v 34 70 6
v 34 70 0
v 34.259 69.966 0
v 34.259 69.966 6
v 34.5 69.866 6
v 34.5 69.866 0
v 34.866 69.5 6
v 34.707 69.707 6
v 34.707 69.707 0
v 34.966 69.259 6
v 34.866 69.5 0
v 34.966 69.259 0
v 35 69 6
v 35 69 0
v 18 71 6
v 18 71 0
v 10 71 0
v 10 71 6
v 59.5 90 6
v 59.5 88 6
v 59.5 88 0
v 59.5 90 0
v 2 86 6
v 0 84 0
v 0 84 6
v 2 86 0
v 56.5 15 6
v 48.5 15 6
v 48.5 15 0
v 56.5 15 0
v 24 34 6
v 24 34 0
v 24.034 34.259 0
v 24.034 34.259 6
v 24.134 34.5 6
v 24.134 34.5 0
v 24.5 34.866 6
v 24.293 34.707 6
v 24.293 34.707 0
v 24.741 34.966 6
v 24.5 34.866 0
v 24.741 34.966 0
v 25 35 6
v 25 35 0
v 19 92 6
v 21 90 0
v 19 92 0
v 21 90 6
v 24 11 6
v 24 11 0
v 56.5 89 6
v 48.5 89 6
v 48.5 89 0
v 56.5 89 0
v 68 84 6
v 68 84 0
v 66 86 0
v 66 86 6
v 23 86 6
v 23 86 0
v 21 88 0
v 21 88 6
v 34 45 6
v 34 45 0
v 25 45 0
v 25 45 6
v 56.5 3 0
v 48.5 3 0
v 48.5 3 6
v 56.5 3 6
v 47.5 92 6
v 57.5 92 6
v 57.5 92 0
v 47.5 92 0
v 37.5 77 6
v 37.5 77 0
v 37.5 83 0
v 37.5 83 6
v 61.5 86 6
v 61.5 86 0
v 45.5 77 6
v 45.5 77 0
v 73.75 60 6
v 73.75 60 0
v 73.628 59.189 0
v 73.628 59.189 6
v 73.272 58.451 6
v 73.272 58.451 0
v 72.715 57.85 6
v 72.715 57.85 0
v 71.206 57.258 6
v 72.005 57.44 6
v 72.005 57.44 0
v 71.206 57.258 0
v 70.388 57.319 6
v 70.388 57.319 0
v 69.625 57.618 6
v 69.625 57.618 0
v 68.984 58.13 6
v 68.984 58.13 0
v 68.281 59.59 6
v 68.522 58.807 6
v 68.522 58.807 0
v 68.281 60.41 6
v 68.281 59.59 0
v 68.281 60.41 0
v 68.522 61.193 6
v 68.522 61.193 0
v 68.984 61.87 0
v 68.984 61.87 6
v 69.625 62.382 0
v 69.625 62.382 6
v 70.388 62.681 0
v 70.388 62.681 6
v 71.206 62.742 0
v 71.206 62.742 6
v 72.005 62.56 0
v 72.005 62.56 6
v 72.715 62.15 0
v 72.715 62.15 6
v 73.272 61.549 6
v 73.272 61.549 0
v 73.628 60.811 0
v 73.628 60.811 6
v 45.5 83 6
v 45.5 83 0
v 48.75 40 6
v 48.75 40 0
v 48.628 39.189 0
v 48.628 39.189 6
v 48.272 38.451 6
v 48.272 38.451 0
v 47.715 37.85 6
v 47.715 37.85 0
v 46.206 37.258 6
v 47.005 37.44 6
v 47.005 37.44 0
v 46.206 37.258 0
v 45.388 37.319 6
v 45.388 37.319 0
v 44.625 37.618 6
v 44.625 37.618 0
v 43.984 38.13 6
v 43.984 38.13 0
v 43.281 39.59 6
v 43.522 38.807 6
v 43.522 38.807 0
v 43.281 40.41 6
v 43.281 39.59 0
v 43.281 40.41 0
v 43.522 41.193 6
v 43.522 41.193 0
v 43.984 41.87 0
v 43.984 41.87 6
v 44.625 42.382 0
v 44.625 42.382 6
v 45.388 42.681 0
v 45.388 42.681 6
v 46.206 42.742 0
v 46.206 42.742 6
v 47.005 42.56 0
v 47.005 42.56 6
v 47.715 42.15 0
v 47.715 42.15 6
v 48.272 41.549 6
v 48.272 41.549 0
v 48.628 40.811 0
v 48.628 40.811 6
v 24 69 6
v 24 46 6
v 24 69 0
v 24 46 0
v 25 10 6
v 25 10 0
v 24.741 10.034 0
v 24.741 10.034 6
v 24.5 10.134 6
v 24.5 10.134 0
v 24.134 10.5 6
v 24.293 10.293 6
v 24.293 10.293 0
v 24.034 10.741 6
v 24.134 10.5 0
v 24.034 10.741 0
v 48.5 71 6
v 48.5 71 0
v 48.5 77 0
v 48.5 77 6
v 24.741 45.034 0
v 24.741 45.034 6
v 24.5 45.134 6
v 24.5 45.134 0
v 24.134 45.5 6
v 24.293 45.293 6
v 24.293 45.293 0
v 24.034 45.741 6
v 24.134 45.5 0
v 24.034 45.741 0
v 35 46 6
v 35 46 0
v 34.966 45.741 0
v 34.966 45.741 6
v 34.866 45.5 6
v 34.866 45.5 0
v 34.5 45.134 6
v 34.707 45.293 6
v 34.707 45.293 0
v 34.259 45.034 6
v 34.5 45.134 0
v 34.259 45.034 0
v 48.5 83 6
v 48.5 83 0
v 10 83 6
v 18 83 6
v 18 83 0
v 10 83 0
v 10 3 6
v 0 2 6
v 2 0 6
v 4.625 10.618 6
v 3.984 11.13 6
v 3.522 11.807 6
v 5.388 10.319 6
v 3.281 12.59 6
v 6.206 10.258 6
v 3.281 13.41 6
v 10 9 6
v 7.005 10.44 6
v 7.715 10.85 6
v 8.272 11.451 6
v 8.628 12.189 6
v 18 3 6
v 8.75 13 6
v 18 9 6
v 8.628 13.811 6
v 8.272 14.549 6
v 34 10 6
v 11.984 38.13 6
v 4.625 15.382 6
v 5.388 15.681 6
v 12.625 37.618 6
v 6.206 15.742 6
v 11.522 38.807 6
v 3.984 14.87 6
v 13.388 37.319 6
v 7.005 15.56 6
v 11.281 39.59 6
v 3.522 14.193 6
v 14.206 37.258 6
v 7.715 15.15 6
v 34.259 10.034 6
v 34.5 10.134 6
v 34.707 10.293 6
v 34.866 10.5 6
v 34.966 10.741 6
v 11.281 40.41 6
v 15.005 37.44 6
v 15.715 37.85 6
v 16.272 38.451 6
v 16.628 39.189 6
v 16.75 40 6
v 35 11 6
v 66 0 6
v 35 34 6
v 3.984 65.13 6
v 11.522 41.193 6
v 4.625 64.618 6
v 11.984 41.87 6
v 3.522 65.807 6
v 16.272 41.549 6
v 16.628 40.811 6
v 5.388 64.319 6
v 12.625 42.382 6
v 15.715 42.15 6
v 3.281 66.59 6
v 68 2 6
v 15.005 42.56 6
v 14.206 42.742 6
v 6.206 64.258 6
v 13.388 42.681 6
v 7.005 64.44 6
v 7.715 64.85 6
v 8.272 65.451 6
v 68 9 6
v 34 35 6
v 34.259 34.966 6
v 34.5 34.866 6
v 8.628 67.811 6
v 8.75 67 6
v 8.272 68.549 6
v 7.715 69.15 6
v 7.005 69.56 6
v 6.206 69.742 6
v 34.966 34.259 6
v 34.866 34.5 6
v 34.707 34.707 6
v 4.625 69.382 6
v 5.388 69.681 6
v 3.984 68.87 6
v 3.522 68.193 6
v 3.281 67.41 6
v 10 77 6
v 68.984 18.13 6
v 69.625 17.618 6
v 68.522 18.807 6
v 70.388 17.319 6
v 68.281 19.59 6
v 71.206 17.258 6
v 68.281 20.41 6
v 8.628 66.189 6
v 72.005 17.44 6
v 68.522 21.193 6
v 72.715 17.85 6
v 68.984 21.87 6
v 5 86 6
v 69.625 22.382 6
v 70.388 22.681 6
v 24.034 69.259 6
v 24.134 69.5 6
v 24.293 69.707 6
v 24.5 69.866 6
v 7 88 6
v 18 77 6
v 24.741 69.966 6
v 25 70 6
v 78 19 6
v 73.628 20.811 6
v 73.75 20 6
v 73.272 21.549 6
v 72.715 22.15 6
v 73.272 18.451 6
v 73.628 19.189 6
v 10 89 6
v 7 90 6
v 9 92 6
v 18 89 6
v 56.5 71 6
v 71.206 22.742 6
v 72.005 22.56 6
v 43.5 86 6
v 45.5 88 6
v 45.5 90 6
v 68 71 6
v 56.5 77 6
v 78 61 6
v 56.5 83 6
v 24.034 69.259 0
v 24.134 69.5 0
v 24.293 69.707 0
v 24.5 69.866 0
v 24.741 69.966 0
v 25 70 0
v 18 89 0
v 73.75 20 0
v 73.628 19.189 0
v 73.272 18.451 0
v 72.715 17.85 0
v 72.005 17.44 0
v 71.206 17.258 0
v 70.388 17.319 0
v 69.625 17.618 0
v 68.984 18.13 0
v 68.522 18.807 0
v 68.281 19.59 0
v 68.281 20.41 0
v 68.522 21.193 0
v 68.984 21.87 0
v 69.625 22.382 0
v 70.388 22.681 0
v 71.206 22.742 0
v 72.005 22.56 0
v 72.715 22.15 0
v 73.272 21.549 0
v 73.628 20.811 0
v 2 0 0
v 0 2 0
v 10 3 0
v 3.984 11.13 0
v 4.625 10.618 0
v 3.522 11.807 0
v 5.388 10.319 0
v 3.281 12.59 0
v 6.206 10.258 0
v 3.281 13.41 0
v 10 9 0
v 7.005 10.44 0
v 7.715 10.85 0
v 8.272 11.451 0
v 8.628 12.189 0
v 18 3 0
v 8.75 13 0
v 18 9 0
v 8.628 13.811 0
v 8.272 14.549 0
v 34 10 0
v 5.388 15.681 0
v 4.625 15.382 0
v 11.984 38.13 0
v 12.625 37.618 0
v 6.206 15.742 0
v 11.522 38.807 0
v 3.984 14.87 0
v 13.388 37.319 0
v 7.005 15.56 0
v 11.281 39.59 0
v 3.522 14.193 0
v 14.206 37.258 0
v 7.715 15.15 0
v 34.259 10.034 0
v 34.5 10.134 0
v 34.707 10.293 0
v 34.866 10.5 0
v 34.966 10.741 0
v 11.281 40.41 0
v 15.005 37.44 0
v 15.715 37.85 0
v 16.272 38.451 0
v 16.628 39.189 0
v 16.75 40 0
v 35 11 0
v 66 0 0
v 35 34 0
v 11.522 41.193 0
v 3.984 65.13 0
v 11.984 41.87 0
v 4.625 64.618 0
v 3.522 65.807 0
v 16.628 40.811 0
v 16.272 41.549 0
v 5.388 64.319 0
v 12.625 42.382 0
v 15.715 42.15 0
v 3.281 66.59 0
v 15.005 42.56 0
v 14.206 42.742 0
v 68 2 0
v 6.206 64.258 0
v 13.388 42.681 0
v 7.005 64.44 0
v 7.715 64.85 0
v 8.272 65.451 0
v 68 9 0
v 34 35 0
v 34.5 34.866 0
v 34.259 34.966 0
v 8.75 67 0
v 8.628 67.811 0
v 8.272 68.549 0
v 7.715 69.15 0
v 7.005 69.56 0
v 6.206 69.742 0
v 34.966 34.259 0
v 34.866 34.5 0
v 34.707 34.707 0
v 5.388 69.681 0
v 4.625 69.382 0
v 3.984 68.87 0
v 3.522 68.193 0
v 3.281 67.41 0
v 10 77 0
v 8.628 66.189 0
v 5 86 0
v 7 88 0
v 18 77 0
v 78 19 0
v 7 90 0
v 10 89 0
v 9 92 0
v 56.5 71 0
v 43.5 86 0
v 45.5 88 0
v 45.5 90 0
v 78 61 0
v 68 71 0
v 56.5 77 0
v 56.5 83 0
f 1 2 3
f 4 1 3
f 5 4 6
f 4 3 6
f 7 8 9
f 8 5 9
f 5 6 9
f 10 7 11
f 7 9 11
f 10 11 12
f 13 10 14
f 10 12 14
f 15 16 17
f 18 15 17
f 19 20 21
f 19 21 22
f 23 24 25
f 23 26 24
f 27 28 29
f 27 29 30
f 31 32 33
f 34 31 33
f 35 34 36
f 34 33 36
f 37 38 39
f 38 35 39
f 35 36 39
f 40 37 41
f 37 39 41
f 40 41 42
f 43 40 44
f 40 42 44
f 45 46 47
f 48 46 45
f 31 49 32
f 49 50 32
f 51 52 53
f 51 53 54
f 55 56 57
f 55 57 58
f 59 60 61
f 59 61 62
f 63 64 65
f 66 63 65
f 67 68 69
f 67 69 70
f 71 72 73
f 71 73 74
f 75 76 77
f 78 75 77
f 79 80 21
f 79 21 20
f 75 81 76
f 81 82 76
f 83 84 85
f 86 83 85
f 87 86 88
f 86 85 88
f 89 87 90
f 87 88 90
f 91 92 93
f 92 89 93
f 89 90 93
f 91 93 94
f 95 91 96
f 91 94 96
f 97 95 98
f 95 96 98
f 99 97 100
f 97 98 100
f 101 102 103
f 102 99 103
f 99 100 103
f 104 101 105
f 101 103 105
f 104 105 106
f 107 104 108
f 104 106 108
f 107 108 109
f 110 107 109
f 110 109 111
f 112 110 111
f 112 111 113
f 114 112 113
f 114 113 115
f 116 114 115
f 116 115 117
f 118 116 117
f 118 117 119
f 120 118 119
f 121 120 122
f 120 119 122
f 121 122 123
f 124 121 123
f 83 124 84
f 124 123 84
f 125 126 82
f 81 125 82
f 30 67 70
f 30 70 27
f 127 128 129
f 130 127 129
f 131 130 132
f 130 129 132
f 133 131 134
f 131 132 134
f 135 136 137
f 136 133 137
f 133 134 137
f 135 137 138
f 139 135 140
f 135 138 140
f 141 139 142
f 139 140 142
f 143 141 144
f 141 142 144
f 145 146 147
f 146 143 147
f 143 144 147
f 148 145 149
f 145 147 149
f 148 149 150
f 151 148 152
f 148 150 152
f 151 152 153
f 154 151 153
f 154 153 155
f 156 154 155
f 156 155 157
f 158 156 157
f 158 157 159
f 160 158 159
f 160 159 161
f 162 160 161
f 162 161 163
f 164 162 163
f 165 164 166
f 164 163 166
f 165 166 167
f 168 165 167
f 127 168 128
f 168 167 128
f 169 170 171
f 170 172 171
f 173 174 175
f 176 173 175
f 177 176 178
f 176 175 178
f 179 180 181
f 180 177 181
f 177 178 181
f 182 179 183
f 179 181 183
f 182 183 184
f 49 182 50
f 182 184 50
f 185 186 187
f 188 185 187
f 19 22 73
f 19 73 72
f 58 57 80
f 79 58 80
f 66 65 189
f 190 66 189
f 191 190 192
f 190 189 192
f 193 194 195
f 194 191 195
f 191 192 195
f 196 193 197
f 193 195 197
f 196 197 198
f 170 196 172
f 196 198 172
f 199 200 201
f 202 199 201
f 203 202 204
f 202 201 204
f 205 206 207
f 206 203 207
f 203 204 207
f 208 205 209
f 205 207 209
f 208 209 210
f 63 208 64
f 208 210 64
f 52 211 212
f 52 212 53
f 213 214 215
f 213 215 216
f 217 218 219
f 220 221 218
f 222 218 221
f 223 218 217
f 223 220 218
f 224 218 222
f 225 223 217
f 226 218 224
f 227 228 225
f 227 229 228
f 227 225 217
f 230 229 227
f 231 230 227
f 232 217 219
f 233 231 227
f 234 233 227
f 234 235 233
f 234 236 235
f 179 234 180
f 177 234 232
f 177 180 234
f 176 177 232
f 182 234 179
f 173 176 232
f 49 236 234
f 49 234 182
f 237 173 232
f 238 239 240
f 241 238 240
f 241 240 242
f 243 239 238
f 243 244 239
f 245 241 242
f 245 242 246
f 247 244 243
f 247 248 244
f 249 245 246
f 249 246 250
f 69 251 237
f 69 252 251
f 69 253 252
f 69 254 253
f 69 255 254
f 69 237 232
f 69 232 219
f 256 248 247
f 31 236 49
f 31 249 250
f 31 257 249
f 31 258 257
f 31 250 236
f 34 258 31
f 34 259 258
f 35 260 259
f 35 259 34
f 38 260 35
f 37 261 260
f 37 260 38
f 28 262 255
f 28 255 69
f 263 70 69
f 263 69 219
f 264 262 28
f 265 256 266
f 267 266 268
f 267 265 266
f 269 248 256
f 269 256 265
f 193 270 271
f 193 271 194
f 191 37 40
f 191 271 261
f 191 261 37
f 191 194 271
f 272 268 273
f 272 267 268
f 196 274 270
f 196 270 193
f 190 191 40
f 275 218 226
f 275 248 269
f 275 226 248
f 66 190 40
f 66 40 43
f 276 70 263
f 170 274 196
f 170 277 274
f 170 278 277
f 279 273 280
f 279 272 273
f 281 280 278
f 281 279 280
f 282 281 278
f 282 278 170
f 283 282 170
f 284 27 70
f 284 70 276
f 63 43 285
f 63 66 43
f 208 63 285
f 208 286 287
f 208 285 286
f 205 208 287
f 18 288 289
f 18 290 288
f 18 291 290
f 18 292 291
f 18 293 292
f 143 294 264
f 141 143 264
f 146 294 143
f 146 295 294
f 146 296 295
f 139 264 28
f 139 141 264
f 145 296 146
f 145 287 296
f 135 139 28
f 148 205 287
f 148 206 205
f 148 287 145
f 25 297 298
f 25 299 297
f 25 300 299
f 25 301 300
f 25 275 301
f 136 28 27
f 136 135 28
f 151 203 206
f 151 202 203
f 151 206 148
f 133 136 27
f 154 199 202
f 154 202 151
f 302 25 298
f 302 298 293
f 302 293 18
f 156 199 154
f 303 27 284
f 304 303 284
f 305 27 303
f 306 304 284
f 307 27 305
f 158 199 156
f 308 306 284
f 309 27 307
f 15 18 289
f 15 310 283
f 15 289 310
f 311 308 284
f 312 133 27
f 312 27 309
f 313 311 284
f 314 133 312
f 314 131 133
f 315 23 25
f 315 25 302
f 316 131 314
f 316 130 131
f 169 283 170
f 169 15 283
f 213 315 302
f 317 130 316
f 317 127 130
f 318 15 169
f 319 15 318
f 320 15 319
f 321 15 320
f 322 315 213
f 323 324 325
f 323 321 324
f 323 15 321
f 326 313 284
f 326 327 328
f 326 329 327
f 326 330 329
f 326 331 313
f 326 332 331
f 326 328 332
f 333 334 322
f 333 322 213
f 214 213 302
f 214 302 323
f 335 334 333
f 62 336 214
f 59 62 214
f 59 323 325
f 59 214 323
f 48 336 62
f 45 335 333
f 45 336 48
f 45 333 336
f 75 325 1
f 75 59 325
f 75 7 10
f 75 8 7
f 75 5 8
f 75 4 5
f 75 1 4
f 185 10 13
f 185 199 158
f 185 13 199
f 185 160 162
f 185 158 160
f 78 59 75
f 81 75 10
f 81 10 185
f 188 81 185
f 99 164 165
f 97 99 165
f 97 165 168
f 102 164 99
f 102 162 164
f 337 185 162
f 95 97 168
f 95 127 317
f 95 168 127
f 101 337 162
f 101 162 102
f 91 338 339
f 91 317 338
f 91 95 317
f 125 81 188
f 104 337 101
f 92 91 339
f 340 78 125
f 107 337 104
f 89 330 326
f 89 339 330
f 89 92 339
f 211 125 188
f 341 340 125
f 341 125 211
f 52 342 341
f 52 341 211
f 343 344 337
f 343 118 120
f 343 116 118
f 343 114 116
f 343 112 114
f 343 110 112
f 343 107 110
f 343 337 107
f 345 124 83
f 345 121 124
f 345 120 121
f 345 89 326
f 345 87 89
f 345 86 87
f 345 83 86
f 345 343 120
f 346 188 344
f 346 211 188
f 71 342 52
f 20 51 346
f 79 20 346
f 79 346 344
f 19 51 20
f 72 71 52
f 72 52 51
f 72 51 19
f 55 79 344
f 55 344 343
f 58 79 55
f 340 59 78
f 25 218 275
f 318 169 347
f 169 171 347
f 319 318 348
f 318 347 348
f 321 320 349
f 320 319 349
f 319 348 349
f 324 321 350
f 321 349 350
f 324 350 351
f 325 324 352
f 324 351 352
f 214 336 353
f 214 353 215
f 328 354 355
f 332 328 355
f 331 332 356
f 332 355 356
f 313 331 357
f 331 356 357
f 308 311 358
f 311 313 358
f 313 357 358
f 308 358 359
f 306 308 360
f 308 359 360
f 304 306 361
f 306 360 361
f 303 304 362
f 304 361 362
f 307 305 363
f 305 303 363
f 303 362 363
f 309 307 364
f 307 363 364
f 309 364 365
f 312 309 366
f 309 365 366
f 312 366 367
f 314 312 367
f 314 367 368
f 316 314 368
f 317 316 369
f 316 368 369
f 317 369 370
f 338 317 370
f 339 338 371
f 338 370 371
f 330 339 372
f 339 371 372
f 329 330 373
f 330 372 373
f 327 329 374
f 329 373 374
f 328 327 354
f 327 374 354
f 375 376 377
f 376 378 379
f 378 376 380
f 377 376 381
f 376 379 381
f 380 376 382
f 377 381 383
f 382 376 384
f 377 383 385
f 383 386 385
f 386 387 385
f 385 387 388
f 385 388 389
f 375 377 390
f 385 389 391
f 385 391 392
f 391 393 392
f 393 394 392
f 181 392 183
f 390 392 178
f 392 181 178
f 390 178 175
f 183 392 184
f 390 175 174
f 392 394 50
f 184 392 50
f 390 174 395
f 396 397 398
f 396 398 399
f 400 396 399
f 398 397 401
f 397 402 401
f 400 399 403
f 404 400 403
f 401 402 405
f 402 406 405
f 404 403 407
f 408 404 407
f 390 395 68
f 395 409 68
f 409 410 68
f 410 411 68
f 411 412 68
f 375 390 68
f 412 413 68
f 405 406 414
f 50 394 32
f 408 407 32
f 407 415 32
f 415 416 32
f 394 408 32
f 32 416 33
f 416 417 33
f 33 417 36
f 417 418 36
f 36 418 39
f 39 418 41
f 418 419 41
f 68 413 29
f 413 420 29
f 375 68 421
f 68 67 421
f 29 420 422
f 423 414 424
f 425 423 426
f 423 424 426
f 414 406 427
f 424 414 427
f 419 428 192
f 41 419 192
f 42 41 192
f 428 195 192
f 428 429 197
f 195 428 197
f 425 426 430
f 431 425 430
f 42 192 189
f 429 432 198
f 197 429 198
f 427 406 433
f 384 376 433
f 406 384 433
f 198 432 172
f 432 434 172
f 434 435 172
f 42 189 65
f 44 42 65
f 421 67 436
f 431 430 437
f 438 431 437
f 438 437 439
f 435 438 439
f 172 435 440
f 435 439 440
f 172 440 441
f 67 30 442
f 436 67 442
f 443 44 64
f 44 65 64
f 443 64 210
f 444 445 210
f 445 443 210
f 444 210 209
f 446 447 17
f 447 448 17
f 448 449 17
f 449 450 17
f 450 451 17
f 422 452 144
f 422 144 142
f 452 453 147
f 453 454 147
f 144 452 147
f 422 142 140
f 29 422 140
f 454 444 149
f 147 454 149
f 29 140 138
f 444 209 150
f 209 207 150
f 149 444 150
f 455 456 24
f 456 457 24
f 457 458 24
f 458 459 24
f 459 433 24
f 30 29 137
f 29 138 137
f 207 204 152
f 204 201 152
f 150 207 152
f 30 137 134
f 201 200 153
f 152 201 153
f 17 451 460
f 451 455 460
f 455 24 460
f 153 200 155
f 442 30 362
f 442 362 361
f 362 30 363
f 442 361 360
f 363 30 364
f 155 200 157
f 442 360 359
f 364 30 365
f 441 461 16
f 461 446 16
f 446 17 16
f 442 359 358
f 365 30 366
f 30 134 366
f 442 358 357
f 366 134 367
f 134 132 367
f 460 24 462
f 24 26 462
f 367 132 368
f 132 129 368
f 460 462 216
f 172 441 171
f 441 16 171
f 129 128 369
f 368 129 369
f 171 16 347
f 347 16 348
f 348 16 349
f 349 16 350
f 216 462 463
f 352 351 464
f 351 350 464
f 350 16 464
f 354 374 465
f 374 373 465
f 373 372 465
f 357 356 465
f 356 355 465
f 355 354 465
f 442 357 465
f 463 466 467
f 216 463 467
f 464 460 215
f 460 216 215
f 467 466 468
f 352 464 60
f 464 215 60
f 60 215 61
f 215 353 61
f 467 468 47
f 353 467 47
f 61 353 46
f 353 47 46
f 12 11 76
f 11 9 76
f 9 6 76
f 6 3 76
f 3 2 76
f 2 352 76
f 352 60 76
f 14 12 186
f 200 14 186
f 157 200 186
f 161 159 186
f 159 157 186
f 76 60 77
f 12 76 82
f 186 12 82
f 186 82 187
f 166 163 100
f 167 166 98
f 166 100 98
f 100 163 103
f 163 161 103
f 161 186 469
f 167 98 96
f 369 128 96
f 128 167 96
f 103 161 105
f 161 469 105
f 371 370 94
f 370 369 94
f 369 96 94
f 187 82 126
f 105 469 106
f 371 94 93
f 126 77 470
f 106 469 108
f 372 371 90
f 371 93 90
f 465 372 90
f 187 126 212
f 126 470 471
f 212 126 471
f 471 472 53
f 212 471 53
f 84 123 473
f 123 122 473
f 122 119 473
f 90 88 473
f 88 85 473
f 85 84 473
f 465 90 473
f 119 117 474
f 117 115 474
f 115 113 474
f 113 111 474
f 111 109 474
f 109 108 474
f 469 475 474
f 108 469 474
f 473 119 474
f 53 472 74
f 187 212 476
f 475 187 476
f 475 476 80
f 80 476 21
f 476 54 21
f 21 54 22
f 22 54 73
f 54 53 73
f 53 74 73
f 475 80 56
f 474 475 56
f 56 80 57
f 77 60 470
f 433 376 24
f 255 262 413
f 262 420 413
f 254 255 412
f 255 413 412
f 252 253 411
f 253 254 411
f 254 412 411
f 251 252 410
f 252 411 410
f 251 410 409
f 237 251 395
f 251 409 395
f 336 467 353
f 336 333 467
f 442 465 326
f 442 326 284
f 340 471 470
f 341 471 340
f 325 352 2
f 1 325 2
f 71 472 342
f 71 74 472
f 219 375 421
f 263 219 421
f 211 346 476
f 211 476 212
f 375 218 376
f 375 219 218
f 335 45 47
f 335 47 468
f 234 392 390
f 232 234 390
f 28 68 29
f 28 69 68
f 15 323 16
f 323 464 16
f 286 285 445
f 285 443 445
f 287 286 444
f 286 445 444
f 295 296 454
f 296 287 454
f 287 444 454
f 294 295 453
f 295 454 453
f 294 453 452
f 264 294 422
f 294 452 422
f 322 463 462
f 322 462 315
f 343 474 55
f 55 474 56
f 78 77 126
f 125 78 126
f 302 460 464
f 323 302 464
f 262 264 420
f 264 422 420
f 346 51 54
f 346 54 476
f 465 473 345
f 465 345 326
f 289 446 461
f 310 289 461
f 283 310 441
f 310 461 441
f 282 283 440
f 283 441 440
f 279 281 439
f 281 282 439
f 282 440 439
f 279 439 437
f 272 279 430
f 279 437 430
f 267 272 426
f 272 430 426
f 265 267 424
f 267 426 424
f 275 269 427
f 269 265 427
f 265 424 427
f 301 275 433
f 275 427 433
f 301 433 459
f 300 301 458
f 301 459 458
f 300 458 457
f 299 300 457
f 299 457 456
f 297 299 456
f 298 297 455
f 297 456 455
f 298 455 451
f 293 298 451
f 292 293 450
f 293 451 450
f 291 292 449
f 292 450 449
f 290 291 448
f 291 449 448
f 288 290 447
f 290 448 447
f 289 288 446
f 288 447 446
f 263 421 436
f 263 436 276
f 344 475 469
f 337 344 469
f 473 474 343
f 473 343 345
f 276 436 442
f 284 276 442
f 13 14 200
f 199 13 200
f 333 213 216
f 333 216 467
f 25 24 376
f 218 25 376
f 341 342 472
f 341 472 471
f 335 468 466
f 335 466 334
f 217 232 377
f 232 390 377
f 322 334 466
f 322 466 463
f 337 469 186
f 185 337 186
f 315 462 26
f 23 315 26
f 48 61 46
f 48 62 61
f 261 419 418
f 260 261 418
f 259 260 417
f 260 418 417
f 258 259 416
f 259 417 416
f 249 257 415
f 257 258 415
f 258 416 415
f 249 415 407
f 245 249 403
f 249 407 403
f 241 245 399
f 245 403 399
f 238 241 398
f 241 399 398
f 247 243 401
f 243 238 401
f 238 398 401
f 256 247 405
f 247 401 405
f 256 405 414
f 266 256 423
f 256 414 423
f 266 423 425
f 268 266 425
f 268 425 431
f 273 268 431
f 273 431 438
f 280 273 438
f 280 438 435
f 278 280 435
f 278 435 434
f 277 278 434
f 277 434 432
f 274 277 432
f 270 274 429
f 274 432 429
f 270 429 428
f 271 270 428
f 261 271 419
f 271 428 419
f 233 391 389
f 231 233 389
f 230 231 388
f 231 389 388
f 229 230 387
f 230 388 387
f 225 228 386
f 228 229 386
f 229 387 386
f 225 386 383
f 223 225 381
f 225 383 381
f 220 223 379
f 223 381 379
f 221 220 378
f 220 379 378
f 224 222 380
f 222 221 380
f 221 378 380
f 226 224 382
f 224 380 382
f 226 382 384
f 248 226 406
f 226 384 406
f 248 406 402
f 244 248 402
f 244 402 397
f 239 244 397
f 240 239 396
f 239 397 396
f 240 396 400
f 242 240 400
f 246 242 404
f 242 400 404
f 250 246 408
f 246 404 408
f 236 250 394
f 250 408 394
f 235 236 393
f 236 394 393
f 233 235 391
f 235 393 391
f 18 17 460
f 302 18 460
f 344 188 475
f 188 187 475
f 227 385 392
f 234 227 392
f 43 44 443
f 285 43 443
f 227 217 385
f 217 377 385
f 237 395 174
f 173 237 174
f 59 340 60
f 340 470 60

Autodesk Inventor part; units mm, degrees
ref_plane "YZ Plane" through (0, 0, 0) normal (1, 0, 0) x (0, 1, 0)
ref_plane "XZ Plane" through (0, 0, 0) normal (0, 1, 0) x (-1, 0, 0)
ref_plane "XY Plane" through (0, 0, 0) normal (0, 0, 1) x (1, 0, 0)
sketch "Sketch1" plane through (0, 0, 0) normal (0, 0, 1) x (1, 0, 0)
  line L0 (0, 0) -> (68, 0)
  line L1 (68, 86) -> (0, 86)
  line L2 (0, 86) -> (0, 0)
  line L3 (68, 71) -> (78, 61)
  line L4 (78, 61) -> (78, 19)
  line L5 (78, 19) -> (68, 9)
  line L6 (68, 0) -> (68, 9)
  line L7 (68, 71) -> (68, 86)
  line L8 (37.5, 83) -> (45.5, 83)
  line L9 (45.5, 83) -> (45.5, 77)
  line L10 (45.5, 77) -> (37.5, 77)
  line L11 (37.5, 77) -> (37.5, 83)
  line L12 (10, 77) -> (18, 77)
  line L13 (18, 77) -> (18, 71)
  line L14 (18, 71) -> (10, 71)
  line L15 (10, 71) -> (10, 77)
  line L16 (10, 9) -> (18, 9)
  line L17 (18, 9) -> (18, 3)
  line L18 (18, 3) -> (10, 3)
  line L19 (10, 3) -> (10, 9)
  line L20 (25, 70) -> (34, 70)
  line L21 (35, 69) -> (35, 46)
  line L22 (34, 45) -> (25, 45)
  line L23 (24, 46) -> (24, 69)
  line L24 (25, 35) -> (34, 35)
  line L25 (35, 34) -> (35, 11)
  line L26 (34, 10) -> (25, 10)
  line L27 (24, 11) -> (24, 34)
  arc A0 (25, 70) -> (24, 69) centre (25, 69) ccw
  arc A1 (35, 69) -> (34, 70) centre (34, 69) ccw
  arc A2 (34, 45) -> (35, 46) centre (34, 46) ccw
  arc A3 (24, 46) -> (25, 45) centre (25, 46) ccw
  arc A4 (25, 35) -> (24, 34) centre (25, 34) ccw
  arc A5 (24, 11) -> (25, 10) centre (25, 11) ccw
  arc A6 (34, 10) -> (35, 11) centre (34, 11) ccw
  arc A7 (35, 34) -> (34, 35) centre (34, 34) ccw
  line L28 (29.5, 70) -> (29.5, 10) construction
  circle A8 centre (71, 60) radius 2.75
  circle A9 centre (71, 20) radius 2.75
  line L29 (48.5, 3) -> (56.5, 3)
  line L30 (56.5, 3) -> (56.5, 9)
  line L31 (56.5, 9) -> (48.5, 9)
  line L32 (48.5, 9) -> (48.5, 3)
  circle A10 centre (6, 13) radius 5 construction
  circle A11 centre (6, 13) radius 2.75
  circle A12 centre (6, 67) radius 5 construction
  circle A13 centre (6, 67) radius 2.75
  line L33 (48.5, 77) -> (56.5, 77)
  line L34 (56.5, 77) -> (56.5, 71)
  line L35 (56.5, 71) -> (48.5, 71)
  line L36 (48.5, 71) -> (48.5, 77)
  line L37 (21, 83) -> (29, 83)
  line L38 (29, 83) -> (29, 77)
  line L39 (29, 77) -> (21, 77)
  line L40 (21, 77) -> (21, 83)
  circle A14 centre (71, 60) radius 5 construction
  circle A15 centre (71, 20) radius 5 construction
  circle A16 centre (14, 40) radius 5 construction
  circle A17 centre (46, 40) radius 5 construction
  circle A18 centre (46, 40) radius 2.75
  circle A19 centre (14, 40) radius 2.75
  line L41 (50, 86) -> (50, 0) construction
  line L42 (55, 86) -> (55, 0) construction
  line L43 (52.5, 86) -> (52.5, 0) construction
  point P0 (78, 40)
  dimension "d1" = 45
  dimension "d2" = 10
  dimension "d3" = 6
  dimension "d4" = 6
  dimension "d5" = 8
  dimension "d6" = 8
  dimension "d7" = 3
  dimension "d8" = 6
  dimension "d9" = 3
  dimension "d12" = 1
  dimension "d13" = 11
  dimension "d14" = 25
  dimension "d15" = 25
  dimension "d16" = 1
  dimension "d17" = 1
  dimension "d18" = 38.5
  dimension "d19" = 5.5
  dimension "d20" = 5.5
  dimension "d21" = 7
  dimension "d23" = 6
  dimension "d24" = 8
  dimension "d25" = 11
  dimension "d26" = 11
  dimension "d27" = 10
  dimension "d28" = 5.5
  dimension "d29" = 5.5
  dimension "d30" = 10
  dimension "d32" = 4
  dimension "d33" = 4
  dimension "d34" = 4
  dimension "d35" = 6
  dimension "d36" = 68
  dimension "d37" = 11.5
  dimension "d38" = 3
  dimension "d39" = 8
  dimension "d40" = 3
  dimension "d41" = 10
  dimension "d42" = 10
  dimension "d43" = 4
  dimension "d44" = 10
  dimension "d45" = 5.5
  dimension "d46" = 10
  dimension "d47" = 5.5
  dimension "d49" = 14
  dimension "d50" = 32
  dimension "d51" = 5
  dimension "d52" = 2.5
  dimension "d53" = 15.5
  dimension "d69" = 86
extrude "Extrusion1" add sketch "Sketch1" along normal blind 6
chamfer "Chamfer1" distance 2 angle 45 4 edges at (0, 0, 3) (68, 0, 3) (68, 86, 3) (0, 86, 3)
sketch "Sketch2" plane through (0, 0, 6) normal (0, 0, 1) x (1, 0, 0)
  line L0 (48.5, 9) -> (56.5, 9) projected
  line L1 (68, 2) -> (68, 9) projected
  line L2 (48.5, 15) -> (56.5, 15)
  line L3 (56.5, 15) -> (56.5, 9)
  line L4 (56.5, 9) -> (48.5, 9)
  line L5 (48.5, 9) -> (48.5, 15)
  point P0 (0, 0)
  dimension "d59" = 6
  dimension "d60" = 8
  dimension "d63" = 11.5
extrude "Extrusion2" cut sketch "Sketch2" against normal through all
sketch "Sketch3" plane through (0, 0, 6) normal (0, 0, 1) x (1, 0, 0)
  line L0 (29, 83) -> (29, 77) projected
  line L1 (29, 77) -> (21, 77) projected
  line L2 (21, 77) -> (21, 83) projected
  line L3 (21, 83) -> (29, 83) projected
  point P0 (0, 0)
extrude "Extrusion3" add sketch "Sketch3" against normal blind 6
sketch "Sketch6" plane through (0, 0, 6) normal (0, 0, 1) x (1, 0, 0)
  line L0 (56.5, 77) -> (56.5, 71) projected
  line L1 (48.5, 71) -> (48.5, 77) projected
  line L2 (18, 77) -> (18, 71) projected
  line L3 (10, 71) -> (10, 77) projected
  line L4 (66, 86) -> (2, 86) projected
  line L5 (7, 86) -> (21, 86)
  line L6 (21, 86) -> (21, 92)
  line L7 (21, 92) -> (7, 92)
  line L8 (7, 92) -> (7, 86)
  line L9 (45.5, 86) -> (59.5, 86)
  line L10 (59.5, 86) -> (59.5, 92)
  line L11 (59.5, 92) -> (45.5, 92)
  line L12 (45.5, 92) -> (45.5, 86)
  point P0 (0, 0)
  dimension "d80" = 3
  dimension "d81" = 3
  dimension "d82" = 3
  dimension "d83" = 3
  dimension "d84" = 6
extrude "Extrusion6" add sketch "Sketch6" against normal blind 6
sketch "Sketch7" plane through (0, 0, 6) normal (0, 0, 1) x (1, 0, 0)
  line L0 (56.5, 77) -> (56.5, 71) projected
  line L1 (48.5, 71) -> (48.5, 77) projected
  line L2 (18, 77) -> (18, 71) projected
  line L3 (10, 71) -> (10, 77) projected
  line L4 (45.5, 83) -> (45.5, 77) projected
  line L5 (37.5, 77) -> (37.5, 83) projected
  line L6 (37.5, 83) -> (45.5, 83) projected
  line L7 (10, 89) -> (18, 89)
  line L8 (18, 89) -> (18, 83)
  line L9 (18, 83) -> (10, 83)
  line L10 (10, 83) -> (10, 89)
  line L11 (48.5, 89) -> (56.5, 89)
  line L12 (56.5, 89) -> (56.5, 83)
  line L13 (56.5, 83) -> (48.5, 83)
  line L14 (48.5, 83) -> (48.5, 89)
  point P0 (0, 0)
extrude "Extrusion7" cut sketch "Sketch7" against normal blind 6
chamfer "Chamfer3" distance 2 angle 45 8 edges at (7, 86, 3) (7, 92, 3) (21, 92, 3) (21, 86, 3) (45.5, 86, 3) (45.5, 92, 3) (59.5, 92, 3) (59.5, 86, 3)
properties part number "x_motor_top"
